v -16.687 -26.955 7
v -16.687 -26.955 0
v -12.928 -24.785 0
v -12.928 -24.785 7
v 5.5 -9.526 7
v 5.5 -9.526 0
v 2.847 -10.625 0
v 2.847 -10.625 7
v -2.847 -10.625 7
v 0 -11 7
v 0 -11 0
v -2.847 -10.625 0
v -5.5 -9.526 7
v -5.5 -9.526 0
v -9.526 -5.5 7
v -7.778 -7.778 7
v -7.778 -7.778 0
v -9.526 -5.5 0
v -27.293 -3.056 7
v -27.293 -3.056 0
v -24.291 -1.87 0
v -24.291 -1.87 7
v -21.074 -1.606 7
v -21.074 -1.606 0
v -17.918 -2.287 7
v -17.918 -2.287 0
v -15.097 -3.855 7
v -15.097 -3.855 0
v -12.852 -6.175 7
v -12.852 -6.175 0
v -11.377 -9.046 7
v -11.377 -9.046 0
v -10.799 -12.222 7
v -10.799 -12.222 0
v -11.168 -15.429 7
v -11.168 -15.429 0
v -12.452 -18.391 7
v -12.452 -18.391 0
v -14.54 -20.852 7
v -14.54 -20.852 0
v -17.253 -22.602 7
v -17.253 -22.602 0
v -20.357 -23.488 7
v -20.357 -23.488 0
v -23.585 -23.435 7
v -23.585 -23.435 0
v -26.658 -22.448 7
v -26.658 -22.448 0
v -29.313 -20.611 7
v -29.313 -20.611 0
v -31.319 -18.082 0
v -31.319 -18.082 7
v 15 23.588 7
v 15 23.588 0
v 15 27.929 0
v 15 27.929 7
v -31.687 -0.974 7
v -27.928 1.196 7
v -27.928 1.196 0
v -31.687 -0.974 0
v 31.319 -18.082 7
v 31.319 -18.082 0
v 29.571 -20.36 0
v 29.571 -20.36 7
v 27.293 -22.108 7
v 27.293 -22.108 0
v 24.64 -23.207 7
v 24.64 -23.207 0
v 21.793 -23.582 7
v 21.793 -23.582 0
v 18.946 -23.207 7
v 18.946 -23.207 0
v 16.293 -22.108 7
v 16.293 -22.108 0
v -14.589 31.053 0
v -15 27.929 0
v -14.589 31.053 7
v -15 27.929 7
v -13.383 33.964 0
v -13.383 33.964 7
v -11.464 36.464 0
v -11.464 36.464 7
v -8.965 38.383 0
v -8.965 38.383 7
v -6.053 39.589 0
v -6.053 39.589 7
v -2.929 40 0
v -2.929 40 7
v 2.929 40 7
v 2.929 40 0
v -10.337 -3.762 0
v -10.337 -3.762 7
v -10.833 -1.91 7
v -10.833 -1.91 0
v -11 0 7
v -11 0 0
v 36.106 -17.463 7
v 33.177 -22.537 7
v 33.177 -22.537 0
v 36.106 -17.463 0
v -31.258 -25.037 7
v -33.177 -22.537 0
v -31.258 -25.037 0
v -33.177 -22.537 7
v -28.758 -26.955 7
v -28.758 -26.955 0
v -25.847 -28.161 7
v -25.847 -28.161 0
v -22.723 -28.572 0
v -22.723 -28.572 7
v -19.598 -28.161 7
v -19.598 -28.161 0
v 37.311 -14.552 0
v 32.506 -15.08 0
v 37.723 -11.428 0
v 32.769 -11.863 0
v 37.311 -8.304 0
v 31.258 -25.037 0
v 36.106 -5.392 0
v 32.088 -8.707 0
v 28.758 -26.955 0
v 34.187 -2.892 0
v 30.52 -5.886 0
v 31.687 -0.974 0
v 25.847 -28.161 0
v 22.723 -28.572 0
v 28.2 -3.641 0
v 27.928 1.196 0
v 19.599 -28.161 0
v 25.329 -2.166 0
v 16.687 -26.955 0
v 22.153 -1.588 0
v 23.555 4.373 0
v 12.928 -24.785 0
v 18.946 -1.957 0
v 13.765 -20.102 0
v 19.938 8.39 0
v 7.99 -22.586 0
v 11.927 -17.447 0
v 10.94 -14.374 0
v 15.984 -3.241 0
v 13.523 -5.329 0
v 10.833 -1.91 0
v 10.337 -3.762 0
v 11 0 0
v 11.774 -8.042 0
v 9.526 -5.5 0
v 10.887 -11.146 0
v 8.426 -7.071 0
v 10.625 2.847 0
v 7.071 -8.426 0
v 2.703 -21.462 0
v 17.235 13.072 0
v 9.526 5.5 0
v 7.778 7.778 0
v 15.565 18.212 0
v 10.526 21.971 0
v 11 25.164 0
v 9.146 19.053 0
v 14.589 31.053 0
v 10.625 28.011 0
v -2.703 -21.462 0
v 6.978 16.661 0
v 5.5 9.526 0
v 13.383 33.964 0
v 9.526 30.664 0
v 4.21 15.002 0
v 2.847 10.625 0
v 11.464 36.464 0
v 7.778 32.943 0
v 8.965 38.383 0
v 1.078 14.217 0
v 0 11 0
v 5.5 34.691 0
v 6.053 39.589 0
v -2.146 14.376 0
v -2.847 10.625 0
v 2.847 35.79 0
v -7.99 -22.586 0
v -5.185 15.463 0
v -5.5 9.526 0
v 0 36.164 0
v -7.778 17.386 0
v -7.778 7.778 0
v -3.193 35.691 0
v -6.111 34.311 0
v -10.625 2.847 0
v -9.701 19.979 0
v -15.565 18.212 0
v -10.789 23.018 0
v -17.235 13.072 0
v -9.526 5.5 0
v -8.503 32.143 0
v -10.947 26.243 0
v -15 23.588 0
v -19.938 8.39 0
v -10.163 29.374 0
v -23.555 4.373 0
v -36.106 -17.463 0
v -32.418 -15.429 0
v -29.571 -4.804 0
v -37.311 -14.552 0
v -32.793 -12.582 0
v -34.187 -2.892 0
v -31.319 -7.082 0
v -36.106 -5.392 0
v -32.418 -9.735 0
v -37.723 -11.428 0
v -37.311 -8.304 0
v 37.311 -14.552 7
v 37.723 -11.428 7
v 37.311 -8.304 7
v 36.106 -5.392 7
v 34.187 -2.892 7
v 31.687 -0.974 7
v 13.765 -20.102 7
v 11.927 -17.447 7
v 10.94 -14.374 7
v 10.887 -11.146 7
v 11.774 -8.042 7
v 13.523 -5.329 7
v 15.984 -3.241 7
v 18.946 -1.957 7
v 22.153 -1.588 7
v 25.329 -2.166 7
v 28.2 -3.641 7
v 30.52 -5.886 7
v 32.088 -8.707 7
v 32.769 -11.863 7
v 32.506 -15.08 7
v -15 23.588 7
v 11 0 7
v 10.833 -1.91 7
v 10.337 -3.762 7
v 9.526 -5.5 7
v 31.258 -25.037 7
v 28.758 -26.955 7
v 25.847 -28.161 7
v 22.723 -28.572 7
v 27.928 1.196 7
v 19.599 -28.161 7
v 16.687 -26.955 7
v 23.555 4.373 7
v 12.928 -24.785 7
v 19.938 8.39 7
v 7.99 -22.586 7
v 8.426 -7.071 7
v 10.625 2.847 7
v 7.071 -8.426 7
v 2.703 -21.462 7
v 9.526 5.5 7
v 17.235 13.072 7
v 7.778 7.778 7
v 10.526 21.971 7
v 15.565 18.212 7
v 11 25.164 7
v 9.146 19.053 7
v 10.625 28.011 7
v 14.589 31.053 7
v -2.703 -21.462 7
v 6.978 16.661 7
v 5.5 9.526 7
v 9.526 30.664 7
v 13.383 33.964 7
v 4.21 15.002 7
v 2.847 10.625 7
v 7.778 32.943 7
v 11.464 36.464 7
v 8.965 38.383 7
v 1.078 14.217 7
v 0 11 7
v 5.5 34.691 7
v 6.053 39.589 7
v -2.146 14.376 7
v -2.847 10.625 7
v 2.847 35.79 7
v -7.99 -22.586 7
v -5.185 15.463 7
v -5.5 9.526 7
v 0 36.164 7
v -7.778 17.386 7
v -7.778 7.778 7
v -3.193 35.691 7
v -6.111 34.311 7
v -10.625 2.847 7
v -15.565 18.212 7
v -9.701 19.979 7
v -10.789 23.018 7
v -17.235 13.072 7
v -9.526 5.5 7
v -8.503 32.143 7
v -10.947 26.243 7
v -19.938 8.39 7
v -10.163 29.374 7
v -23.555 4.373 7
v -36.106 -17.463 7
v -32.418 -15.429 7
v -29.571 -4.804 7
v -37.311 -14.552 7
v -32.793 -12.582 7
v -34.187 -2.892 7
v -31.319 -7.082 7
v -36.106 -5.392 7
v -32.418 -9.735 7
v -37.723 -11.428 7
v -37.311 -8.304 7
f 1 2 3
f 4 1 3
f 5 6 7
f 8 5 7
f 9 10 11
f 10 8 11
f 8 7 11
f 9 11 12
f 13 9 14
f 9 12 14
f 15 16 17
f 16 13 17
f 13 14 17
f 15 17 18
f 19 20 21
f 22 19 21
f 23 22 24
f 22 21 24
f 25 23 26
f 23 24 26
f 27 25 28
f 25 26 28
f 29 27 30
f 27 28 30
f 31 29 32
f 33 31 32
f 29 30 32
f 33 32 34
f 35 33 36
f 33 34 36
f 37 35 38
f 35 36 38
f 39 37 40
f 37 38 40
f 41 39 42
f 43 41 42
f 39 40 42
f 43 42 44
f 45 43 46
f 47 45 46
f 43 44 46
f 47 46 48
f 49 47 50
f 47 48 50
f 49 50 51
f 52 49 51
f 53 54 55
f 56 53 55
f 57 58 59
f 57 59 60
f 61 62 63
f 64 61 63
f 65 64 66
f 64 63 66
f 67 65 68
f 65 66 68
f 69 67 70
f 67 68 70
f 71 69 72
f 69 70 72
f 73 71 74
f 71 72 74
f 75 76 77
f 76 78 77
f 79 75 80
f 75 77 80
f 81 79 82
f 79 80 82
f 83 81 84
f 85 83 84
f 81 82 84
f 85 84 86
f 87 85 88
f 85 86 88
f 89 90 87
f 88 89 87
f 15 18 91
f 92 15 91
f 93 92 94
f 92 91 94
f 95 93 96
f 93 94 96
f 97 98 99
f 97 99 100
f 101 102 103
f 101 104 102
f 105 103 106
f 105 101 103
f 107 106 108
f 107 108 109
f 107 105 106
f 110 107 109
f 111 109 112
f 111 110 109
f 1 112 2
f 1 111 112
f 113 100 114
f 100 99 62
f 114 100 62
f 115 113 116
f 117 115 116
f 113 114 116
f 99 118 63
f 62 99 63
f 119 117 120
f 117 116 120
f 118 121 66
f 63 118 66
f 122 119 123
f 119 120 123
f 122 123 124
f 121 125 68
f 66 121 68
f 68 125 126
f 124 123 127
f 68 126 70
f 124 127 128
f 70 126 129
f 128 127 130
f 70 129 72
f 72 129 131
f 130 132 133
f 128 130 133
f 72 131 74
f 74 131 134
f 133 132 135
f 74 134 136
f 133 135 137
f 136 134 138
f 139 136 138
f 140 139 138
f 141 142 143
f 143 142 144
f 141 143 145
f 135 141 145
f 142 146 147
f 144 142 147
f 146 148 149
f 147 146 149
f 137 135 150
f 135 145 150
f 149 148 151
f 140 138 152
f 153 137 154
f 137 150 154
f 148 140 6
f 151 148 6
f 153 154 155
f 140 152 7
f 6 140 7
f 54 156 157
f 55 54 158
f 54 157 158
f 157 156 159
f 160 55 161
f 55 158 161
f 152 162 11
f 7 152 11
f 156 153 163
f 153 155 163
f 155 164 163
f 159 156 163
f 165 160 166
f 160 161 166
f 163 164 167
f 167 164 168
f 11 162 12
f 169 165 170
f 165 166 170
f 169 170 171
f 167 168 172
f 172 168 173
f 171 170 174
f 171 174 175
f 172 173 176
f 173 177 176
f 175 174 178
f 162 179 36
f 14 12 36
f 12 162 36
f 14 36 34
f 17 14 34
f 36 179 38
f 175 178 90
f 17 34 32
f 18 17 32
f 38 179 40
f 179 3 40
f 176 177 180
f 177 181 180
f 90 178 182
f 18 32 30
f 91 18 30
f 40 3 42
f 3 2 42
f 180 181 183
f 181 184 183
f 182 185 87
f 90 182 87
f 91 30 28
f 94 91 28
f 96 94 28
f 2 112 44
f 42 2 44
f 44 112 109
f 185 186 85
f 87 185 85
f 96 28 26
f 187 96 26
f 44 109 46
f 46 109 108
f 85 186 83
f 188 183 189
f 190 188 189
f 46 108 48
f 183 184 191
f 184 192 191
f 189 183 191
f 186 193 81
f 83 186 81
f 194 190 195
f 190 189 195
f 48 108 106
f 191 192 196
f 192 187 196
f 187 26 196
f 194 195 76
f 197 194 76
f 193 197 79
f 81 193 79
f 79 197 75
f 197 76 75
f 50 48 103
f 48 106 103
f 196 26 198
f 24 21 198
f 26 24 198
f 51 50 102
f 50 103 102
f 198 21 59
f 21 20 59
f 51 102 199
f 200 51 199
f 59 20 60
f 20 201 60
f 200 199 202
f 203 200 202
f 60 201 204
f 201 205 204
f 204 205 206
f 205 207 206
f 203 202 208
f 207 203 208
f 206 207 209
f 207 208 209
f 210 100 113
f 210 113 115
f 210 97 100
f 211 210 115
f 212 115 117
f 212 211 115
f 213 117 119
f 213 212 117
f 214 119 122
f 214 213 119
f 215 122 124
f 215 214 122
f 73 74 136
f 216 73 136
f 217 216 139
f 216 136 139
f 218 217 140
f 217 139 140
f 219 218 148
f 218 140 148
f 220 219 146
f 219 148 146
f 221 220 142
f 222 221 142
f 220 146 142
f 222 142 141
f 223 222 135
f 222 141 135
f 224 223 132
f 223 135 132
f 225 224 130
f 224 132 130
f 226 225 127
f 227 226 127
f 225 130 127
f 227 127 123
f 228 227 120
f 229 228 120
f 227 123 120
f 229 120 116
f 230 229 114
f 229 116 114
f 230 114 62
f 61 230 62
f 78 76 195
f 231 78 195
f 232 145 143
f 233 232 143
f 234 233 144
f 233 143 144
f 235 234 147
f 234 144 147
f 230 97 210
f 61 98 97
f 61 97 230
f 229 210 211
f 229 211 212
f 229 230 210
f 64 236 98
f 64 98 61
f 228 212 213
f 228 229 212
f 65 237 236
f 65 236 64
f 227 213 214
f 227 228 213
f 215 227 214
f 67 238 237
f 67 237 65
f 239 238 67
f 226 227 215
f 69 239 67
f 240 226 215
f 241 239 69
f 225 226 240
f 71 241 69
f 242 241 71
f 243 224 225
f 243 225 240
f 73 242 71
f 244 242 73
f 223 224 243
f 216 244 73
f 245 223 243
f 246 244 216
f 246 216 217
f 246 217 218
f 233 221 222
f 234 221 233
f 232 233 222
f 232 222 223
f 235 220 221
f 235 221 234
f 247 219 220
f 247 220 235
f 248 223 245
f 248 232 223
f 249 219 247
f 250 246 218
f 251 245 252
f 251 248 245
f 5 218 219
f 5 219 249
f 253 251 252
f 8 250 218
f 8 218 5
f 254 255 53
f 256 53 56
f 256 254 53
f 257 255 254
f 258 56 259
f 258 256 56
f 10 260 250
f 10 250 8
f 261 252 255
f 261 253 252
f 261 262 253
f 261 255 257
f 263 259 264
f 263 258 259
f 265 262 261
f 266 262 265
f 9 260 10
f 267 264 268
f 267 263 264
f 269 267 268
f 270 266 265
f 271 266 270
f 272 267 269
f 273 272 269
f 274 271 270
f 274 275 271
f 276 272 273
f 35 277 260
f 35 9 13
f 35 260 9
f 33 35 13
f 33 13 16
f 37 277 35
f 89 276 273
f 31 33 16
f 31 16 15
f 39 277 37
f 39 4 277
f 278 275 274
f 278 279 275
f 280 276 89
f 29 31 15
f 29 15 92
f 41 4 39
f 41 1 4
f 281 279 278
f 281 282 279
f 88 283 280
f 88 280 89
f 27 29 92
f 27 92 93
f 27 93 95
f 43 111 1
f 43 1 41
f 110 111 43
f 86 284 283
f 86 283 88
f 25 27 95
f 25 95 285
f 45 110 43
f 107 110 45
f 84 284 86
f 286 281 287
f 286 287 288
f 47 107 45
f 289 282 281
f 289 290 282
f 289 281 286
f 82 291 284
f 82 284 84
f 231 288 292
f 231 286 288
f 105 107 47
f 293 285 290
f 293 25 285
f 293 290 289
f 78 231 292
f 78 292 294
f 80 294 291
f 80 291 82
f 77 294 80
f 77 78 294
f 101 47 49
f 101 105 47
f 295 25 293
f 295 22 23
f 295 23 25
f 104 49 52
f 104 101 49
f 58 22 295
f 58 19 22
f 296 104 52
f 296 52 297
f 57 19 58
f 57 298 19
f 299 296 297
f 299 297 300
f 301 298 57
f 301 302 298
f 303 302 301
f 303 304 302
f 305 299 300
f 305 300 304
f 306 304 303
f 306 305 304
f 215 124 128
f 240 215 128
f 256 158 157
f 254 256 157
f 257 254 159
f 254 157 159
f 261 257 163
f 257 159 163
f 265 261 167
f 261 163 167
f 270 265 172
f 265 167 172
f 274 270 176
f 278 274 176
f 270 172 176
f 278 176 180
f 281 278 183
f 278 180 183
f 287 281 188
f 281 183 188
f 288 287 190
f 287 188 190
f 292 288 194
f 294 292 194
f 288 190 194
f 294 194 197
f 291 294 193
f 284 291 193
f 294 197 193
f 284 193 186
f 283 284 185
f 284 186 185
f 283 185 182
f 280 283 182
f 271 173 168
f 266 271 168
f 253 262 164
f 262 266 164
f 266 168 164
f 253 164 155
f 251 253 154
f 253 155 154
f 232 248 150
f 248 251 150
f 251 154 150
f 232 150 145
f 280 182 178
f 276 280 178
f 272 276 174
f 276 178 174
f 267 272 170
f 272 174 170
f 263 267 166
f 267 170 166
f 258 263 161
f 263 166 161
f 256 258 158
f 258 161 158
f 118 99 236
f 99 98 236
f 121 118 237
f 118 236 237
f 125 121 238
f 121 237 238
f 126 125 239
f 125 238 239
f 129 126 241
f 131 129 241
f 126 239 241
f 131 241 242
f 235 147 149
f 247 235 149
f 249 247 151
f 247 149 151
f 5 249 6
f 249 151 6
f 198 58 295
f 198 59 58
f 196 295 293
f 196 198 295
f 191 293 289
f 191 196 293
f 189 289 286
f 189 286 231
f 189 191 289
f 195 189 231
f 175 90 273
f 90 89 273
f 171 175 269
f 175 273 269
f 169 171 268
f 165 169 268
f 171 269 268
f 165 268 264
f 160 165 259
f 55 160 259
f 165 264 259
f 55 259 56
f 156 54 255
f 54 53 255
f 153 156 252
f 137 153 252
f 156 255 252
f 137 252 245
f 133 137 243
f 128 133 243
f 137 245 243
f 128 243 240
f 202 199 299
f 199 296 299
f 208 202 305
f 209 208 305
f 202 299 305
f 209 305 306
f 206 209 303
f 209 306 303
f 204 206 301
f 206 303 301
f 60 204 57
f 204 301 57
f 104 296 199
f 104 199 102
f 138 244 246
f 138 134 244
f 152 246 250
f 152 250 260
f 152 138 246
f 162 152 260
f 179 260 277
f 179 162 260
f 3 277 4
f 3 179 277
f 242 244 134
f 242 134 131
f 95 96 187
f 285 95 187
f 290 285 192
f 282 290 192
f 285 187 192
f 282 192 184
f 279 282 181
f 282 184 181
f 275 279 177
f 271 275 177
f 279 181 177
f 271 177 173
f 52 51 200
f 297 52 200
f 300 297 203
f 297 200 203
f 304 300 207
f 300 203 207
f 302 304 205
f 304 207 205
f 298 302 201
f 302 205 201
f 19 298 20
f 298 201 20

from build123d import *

# Parameters (mm, degrees)
F1_DEPTH = 7
F3_ANGLE = 120
F4_ANGLE = 240
F6_R     = 25.8564064606
F7_R     = 25.856
F8_R     = 25.856
F9_R     = 12.0710678119
F10_R    = 12.071
F11_R    = 12.071
F12_R    = 12.071
F13_R    = 12.071
F14_R    = 12.071


with BuildPart() as f1:
    # F0 (on Top) → F1 (new body)
    with BuildSketch(Plane.XY):
        with BuildLine():
            ThreePointArc((-11, 0), (-7.7781745931, 7.7781745931), (0, 11))
            Line((0, 11), (0, 14.1644365489))
            ThreePointArc((0, 14.1644365489), (-11, 25.1644365489), (0, 36.1644365489))
            Line((0, 36.1644365489), (0, 40))
            Line((0, 40), (-15, 40))
            Line((-15, 40), (-15, 0))
            Line((-15, 0), (-11, 0))
        make_face()
        with BuildLine():
            ThreePointArc((0, 11), (7.7781745931, 7.7781745931), (11, 0))
            Line((11, 0), (15, 0))
            Line((15, 0), (15, 40))
            Line((15, 40), (0, 40))
            Line((0, 40), (0, 36.1644365489))
            ThreePointArc((0, 36.1644365489), (7.7781745931, 32.942611142), (11, 25.1644365489))
            ThreePointArc((11, 25.1644365489), (7.7781745931, 17.3862619559), (0, 14.1644365489))
            Line((0, 14.1644365489), (0, 11))
        make_face()
    extrude(amount=F1_DEPTH)


with BuildPart() as f3_1:
    # F3: copy of F1
    add(f1.part.rotate(Axis((0, 0, 22.2638938576), (0, 0, 1)), F3_ANGLE))


with BuildPart() as f4_1:
    # F4: copy of F1
    add(f1.part.rotate(Axis((0, 0, 22.2638938576), (0, 0, 1)), F4_ANGLE))


with BuildPart() as f1_1:
    add(f1.part)

    # F5: union F3_1, F4_1
    add(f3_1.part)
    add(f4_1.part)

    # F6
    f6_edges = [f1_1.edges().sort_by_distance(p)[0] for p in [
        (0, -17.320508, 3.5),
    ]]
    fillet(f6_edges, radius=F6_R)

    # F7
    f7_edges = [f1_1.edges().sort_by_distance(p)[0] for p in [
        (-15, 8.660254, 3.5),
    ]]
    fillet(f7_edges, radius=F7_R)

    # F8
    f8_edges = [f1_1.edges().sort_by_distance(p)[0] for p in [
        (15, 8.660254, 3.5),
    ]]
    fillet(f8_edges, radius=F8_R)

    # F9
    f9_edges = [f1_1.edges().sort_by_distance(p)[0] for p in [
        (-27.141016, -32.990381, 3.5),
    ]]
    fillet(f9_edges, radius=F9_R)

    # F10
    f10_edges = [f1_1.edges().sort_by_distance(p)[0] for p in [
        (-42.141016, -7.009619, 3.5),
    ]]
    fillet(f10_edges, radius=F10_R)

    # F11
    f11_edges = [f1_1.edges().sort_by_distance(p)[0] for p in [
        (-15, 40, 3.5),
    ]]
    fillet(f11_edges, radius=F11_R)

    # F12
    f12_edges = [f1_1.edges().sort_by_distance(p)[0] for p in [
        (15, 40, 3.5),
    ]]
    fillet(f12_edges, radius=F12_R)

    # F13
    f13_edges = [f1_1.edges().sort_by_distance(p)[0] for p in [
        (27.141016, -32.990381, 3.5),
    ]]
    fillet(f13_edges, radius=F13_R)

    # F14
    f14_edges = [f1_1.edges().sort_by_distance(p)[0] for p in [
        (42.141016, -7.009619, 3.5),
    ]]
    fillet(f14_edges, radius=F14_R)


solid = f1_1.part
